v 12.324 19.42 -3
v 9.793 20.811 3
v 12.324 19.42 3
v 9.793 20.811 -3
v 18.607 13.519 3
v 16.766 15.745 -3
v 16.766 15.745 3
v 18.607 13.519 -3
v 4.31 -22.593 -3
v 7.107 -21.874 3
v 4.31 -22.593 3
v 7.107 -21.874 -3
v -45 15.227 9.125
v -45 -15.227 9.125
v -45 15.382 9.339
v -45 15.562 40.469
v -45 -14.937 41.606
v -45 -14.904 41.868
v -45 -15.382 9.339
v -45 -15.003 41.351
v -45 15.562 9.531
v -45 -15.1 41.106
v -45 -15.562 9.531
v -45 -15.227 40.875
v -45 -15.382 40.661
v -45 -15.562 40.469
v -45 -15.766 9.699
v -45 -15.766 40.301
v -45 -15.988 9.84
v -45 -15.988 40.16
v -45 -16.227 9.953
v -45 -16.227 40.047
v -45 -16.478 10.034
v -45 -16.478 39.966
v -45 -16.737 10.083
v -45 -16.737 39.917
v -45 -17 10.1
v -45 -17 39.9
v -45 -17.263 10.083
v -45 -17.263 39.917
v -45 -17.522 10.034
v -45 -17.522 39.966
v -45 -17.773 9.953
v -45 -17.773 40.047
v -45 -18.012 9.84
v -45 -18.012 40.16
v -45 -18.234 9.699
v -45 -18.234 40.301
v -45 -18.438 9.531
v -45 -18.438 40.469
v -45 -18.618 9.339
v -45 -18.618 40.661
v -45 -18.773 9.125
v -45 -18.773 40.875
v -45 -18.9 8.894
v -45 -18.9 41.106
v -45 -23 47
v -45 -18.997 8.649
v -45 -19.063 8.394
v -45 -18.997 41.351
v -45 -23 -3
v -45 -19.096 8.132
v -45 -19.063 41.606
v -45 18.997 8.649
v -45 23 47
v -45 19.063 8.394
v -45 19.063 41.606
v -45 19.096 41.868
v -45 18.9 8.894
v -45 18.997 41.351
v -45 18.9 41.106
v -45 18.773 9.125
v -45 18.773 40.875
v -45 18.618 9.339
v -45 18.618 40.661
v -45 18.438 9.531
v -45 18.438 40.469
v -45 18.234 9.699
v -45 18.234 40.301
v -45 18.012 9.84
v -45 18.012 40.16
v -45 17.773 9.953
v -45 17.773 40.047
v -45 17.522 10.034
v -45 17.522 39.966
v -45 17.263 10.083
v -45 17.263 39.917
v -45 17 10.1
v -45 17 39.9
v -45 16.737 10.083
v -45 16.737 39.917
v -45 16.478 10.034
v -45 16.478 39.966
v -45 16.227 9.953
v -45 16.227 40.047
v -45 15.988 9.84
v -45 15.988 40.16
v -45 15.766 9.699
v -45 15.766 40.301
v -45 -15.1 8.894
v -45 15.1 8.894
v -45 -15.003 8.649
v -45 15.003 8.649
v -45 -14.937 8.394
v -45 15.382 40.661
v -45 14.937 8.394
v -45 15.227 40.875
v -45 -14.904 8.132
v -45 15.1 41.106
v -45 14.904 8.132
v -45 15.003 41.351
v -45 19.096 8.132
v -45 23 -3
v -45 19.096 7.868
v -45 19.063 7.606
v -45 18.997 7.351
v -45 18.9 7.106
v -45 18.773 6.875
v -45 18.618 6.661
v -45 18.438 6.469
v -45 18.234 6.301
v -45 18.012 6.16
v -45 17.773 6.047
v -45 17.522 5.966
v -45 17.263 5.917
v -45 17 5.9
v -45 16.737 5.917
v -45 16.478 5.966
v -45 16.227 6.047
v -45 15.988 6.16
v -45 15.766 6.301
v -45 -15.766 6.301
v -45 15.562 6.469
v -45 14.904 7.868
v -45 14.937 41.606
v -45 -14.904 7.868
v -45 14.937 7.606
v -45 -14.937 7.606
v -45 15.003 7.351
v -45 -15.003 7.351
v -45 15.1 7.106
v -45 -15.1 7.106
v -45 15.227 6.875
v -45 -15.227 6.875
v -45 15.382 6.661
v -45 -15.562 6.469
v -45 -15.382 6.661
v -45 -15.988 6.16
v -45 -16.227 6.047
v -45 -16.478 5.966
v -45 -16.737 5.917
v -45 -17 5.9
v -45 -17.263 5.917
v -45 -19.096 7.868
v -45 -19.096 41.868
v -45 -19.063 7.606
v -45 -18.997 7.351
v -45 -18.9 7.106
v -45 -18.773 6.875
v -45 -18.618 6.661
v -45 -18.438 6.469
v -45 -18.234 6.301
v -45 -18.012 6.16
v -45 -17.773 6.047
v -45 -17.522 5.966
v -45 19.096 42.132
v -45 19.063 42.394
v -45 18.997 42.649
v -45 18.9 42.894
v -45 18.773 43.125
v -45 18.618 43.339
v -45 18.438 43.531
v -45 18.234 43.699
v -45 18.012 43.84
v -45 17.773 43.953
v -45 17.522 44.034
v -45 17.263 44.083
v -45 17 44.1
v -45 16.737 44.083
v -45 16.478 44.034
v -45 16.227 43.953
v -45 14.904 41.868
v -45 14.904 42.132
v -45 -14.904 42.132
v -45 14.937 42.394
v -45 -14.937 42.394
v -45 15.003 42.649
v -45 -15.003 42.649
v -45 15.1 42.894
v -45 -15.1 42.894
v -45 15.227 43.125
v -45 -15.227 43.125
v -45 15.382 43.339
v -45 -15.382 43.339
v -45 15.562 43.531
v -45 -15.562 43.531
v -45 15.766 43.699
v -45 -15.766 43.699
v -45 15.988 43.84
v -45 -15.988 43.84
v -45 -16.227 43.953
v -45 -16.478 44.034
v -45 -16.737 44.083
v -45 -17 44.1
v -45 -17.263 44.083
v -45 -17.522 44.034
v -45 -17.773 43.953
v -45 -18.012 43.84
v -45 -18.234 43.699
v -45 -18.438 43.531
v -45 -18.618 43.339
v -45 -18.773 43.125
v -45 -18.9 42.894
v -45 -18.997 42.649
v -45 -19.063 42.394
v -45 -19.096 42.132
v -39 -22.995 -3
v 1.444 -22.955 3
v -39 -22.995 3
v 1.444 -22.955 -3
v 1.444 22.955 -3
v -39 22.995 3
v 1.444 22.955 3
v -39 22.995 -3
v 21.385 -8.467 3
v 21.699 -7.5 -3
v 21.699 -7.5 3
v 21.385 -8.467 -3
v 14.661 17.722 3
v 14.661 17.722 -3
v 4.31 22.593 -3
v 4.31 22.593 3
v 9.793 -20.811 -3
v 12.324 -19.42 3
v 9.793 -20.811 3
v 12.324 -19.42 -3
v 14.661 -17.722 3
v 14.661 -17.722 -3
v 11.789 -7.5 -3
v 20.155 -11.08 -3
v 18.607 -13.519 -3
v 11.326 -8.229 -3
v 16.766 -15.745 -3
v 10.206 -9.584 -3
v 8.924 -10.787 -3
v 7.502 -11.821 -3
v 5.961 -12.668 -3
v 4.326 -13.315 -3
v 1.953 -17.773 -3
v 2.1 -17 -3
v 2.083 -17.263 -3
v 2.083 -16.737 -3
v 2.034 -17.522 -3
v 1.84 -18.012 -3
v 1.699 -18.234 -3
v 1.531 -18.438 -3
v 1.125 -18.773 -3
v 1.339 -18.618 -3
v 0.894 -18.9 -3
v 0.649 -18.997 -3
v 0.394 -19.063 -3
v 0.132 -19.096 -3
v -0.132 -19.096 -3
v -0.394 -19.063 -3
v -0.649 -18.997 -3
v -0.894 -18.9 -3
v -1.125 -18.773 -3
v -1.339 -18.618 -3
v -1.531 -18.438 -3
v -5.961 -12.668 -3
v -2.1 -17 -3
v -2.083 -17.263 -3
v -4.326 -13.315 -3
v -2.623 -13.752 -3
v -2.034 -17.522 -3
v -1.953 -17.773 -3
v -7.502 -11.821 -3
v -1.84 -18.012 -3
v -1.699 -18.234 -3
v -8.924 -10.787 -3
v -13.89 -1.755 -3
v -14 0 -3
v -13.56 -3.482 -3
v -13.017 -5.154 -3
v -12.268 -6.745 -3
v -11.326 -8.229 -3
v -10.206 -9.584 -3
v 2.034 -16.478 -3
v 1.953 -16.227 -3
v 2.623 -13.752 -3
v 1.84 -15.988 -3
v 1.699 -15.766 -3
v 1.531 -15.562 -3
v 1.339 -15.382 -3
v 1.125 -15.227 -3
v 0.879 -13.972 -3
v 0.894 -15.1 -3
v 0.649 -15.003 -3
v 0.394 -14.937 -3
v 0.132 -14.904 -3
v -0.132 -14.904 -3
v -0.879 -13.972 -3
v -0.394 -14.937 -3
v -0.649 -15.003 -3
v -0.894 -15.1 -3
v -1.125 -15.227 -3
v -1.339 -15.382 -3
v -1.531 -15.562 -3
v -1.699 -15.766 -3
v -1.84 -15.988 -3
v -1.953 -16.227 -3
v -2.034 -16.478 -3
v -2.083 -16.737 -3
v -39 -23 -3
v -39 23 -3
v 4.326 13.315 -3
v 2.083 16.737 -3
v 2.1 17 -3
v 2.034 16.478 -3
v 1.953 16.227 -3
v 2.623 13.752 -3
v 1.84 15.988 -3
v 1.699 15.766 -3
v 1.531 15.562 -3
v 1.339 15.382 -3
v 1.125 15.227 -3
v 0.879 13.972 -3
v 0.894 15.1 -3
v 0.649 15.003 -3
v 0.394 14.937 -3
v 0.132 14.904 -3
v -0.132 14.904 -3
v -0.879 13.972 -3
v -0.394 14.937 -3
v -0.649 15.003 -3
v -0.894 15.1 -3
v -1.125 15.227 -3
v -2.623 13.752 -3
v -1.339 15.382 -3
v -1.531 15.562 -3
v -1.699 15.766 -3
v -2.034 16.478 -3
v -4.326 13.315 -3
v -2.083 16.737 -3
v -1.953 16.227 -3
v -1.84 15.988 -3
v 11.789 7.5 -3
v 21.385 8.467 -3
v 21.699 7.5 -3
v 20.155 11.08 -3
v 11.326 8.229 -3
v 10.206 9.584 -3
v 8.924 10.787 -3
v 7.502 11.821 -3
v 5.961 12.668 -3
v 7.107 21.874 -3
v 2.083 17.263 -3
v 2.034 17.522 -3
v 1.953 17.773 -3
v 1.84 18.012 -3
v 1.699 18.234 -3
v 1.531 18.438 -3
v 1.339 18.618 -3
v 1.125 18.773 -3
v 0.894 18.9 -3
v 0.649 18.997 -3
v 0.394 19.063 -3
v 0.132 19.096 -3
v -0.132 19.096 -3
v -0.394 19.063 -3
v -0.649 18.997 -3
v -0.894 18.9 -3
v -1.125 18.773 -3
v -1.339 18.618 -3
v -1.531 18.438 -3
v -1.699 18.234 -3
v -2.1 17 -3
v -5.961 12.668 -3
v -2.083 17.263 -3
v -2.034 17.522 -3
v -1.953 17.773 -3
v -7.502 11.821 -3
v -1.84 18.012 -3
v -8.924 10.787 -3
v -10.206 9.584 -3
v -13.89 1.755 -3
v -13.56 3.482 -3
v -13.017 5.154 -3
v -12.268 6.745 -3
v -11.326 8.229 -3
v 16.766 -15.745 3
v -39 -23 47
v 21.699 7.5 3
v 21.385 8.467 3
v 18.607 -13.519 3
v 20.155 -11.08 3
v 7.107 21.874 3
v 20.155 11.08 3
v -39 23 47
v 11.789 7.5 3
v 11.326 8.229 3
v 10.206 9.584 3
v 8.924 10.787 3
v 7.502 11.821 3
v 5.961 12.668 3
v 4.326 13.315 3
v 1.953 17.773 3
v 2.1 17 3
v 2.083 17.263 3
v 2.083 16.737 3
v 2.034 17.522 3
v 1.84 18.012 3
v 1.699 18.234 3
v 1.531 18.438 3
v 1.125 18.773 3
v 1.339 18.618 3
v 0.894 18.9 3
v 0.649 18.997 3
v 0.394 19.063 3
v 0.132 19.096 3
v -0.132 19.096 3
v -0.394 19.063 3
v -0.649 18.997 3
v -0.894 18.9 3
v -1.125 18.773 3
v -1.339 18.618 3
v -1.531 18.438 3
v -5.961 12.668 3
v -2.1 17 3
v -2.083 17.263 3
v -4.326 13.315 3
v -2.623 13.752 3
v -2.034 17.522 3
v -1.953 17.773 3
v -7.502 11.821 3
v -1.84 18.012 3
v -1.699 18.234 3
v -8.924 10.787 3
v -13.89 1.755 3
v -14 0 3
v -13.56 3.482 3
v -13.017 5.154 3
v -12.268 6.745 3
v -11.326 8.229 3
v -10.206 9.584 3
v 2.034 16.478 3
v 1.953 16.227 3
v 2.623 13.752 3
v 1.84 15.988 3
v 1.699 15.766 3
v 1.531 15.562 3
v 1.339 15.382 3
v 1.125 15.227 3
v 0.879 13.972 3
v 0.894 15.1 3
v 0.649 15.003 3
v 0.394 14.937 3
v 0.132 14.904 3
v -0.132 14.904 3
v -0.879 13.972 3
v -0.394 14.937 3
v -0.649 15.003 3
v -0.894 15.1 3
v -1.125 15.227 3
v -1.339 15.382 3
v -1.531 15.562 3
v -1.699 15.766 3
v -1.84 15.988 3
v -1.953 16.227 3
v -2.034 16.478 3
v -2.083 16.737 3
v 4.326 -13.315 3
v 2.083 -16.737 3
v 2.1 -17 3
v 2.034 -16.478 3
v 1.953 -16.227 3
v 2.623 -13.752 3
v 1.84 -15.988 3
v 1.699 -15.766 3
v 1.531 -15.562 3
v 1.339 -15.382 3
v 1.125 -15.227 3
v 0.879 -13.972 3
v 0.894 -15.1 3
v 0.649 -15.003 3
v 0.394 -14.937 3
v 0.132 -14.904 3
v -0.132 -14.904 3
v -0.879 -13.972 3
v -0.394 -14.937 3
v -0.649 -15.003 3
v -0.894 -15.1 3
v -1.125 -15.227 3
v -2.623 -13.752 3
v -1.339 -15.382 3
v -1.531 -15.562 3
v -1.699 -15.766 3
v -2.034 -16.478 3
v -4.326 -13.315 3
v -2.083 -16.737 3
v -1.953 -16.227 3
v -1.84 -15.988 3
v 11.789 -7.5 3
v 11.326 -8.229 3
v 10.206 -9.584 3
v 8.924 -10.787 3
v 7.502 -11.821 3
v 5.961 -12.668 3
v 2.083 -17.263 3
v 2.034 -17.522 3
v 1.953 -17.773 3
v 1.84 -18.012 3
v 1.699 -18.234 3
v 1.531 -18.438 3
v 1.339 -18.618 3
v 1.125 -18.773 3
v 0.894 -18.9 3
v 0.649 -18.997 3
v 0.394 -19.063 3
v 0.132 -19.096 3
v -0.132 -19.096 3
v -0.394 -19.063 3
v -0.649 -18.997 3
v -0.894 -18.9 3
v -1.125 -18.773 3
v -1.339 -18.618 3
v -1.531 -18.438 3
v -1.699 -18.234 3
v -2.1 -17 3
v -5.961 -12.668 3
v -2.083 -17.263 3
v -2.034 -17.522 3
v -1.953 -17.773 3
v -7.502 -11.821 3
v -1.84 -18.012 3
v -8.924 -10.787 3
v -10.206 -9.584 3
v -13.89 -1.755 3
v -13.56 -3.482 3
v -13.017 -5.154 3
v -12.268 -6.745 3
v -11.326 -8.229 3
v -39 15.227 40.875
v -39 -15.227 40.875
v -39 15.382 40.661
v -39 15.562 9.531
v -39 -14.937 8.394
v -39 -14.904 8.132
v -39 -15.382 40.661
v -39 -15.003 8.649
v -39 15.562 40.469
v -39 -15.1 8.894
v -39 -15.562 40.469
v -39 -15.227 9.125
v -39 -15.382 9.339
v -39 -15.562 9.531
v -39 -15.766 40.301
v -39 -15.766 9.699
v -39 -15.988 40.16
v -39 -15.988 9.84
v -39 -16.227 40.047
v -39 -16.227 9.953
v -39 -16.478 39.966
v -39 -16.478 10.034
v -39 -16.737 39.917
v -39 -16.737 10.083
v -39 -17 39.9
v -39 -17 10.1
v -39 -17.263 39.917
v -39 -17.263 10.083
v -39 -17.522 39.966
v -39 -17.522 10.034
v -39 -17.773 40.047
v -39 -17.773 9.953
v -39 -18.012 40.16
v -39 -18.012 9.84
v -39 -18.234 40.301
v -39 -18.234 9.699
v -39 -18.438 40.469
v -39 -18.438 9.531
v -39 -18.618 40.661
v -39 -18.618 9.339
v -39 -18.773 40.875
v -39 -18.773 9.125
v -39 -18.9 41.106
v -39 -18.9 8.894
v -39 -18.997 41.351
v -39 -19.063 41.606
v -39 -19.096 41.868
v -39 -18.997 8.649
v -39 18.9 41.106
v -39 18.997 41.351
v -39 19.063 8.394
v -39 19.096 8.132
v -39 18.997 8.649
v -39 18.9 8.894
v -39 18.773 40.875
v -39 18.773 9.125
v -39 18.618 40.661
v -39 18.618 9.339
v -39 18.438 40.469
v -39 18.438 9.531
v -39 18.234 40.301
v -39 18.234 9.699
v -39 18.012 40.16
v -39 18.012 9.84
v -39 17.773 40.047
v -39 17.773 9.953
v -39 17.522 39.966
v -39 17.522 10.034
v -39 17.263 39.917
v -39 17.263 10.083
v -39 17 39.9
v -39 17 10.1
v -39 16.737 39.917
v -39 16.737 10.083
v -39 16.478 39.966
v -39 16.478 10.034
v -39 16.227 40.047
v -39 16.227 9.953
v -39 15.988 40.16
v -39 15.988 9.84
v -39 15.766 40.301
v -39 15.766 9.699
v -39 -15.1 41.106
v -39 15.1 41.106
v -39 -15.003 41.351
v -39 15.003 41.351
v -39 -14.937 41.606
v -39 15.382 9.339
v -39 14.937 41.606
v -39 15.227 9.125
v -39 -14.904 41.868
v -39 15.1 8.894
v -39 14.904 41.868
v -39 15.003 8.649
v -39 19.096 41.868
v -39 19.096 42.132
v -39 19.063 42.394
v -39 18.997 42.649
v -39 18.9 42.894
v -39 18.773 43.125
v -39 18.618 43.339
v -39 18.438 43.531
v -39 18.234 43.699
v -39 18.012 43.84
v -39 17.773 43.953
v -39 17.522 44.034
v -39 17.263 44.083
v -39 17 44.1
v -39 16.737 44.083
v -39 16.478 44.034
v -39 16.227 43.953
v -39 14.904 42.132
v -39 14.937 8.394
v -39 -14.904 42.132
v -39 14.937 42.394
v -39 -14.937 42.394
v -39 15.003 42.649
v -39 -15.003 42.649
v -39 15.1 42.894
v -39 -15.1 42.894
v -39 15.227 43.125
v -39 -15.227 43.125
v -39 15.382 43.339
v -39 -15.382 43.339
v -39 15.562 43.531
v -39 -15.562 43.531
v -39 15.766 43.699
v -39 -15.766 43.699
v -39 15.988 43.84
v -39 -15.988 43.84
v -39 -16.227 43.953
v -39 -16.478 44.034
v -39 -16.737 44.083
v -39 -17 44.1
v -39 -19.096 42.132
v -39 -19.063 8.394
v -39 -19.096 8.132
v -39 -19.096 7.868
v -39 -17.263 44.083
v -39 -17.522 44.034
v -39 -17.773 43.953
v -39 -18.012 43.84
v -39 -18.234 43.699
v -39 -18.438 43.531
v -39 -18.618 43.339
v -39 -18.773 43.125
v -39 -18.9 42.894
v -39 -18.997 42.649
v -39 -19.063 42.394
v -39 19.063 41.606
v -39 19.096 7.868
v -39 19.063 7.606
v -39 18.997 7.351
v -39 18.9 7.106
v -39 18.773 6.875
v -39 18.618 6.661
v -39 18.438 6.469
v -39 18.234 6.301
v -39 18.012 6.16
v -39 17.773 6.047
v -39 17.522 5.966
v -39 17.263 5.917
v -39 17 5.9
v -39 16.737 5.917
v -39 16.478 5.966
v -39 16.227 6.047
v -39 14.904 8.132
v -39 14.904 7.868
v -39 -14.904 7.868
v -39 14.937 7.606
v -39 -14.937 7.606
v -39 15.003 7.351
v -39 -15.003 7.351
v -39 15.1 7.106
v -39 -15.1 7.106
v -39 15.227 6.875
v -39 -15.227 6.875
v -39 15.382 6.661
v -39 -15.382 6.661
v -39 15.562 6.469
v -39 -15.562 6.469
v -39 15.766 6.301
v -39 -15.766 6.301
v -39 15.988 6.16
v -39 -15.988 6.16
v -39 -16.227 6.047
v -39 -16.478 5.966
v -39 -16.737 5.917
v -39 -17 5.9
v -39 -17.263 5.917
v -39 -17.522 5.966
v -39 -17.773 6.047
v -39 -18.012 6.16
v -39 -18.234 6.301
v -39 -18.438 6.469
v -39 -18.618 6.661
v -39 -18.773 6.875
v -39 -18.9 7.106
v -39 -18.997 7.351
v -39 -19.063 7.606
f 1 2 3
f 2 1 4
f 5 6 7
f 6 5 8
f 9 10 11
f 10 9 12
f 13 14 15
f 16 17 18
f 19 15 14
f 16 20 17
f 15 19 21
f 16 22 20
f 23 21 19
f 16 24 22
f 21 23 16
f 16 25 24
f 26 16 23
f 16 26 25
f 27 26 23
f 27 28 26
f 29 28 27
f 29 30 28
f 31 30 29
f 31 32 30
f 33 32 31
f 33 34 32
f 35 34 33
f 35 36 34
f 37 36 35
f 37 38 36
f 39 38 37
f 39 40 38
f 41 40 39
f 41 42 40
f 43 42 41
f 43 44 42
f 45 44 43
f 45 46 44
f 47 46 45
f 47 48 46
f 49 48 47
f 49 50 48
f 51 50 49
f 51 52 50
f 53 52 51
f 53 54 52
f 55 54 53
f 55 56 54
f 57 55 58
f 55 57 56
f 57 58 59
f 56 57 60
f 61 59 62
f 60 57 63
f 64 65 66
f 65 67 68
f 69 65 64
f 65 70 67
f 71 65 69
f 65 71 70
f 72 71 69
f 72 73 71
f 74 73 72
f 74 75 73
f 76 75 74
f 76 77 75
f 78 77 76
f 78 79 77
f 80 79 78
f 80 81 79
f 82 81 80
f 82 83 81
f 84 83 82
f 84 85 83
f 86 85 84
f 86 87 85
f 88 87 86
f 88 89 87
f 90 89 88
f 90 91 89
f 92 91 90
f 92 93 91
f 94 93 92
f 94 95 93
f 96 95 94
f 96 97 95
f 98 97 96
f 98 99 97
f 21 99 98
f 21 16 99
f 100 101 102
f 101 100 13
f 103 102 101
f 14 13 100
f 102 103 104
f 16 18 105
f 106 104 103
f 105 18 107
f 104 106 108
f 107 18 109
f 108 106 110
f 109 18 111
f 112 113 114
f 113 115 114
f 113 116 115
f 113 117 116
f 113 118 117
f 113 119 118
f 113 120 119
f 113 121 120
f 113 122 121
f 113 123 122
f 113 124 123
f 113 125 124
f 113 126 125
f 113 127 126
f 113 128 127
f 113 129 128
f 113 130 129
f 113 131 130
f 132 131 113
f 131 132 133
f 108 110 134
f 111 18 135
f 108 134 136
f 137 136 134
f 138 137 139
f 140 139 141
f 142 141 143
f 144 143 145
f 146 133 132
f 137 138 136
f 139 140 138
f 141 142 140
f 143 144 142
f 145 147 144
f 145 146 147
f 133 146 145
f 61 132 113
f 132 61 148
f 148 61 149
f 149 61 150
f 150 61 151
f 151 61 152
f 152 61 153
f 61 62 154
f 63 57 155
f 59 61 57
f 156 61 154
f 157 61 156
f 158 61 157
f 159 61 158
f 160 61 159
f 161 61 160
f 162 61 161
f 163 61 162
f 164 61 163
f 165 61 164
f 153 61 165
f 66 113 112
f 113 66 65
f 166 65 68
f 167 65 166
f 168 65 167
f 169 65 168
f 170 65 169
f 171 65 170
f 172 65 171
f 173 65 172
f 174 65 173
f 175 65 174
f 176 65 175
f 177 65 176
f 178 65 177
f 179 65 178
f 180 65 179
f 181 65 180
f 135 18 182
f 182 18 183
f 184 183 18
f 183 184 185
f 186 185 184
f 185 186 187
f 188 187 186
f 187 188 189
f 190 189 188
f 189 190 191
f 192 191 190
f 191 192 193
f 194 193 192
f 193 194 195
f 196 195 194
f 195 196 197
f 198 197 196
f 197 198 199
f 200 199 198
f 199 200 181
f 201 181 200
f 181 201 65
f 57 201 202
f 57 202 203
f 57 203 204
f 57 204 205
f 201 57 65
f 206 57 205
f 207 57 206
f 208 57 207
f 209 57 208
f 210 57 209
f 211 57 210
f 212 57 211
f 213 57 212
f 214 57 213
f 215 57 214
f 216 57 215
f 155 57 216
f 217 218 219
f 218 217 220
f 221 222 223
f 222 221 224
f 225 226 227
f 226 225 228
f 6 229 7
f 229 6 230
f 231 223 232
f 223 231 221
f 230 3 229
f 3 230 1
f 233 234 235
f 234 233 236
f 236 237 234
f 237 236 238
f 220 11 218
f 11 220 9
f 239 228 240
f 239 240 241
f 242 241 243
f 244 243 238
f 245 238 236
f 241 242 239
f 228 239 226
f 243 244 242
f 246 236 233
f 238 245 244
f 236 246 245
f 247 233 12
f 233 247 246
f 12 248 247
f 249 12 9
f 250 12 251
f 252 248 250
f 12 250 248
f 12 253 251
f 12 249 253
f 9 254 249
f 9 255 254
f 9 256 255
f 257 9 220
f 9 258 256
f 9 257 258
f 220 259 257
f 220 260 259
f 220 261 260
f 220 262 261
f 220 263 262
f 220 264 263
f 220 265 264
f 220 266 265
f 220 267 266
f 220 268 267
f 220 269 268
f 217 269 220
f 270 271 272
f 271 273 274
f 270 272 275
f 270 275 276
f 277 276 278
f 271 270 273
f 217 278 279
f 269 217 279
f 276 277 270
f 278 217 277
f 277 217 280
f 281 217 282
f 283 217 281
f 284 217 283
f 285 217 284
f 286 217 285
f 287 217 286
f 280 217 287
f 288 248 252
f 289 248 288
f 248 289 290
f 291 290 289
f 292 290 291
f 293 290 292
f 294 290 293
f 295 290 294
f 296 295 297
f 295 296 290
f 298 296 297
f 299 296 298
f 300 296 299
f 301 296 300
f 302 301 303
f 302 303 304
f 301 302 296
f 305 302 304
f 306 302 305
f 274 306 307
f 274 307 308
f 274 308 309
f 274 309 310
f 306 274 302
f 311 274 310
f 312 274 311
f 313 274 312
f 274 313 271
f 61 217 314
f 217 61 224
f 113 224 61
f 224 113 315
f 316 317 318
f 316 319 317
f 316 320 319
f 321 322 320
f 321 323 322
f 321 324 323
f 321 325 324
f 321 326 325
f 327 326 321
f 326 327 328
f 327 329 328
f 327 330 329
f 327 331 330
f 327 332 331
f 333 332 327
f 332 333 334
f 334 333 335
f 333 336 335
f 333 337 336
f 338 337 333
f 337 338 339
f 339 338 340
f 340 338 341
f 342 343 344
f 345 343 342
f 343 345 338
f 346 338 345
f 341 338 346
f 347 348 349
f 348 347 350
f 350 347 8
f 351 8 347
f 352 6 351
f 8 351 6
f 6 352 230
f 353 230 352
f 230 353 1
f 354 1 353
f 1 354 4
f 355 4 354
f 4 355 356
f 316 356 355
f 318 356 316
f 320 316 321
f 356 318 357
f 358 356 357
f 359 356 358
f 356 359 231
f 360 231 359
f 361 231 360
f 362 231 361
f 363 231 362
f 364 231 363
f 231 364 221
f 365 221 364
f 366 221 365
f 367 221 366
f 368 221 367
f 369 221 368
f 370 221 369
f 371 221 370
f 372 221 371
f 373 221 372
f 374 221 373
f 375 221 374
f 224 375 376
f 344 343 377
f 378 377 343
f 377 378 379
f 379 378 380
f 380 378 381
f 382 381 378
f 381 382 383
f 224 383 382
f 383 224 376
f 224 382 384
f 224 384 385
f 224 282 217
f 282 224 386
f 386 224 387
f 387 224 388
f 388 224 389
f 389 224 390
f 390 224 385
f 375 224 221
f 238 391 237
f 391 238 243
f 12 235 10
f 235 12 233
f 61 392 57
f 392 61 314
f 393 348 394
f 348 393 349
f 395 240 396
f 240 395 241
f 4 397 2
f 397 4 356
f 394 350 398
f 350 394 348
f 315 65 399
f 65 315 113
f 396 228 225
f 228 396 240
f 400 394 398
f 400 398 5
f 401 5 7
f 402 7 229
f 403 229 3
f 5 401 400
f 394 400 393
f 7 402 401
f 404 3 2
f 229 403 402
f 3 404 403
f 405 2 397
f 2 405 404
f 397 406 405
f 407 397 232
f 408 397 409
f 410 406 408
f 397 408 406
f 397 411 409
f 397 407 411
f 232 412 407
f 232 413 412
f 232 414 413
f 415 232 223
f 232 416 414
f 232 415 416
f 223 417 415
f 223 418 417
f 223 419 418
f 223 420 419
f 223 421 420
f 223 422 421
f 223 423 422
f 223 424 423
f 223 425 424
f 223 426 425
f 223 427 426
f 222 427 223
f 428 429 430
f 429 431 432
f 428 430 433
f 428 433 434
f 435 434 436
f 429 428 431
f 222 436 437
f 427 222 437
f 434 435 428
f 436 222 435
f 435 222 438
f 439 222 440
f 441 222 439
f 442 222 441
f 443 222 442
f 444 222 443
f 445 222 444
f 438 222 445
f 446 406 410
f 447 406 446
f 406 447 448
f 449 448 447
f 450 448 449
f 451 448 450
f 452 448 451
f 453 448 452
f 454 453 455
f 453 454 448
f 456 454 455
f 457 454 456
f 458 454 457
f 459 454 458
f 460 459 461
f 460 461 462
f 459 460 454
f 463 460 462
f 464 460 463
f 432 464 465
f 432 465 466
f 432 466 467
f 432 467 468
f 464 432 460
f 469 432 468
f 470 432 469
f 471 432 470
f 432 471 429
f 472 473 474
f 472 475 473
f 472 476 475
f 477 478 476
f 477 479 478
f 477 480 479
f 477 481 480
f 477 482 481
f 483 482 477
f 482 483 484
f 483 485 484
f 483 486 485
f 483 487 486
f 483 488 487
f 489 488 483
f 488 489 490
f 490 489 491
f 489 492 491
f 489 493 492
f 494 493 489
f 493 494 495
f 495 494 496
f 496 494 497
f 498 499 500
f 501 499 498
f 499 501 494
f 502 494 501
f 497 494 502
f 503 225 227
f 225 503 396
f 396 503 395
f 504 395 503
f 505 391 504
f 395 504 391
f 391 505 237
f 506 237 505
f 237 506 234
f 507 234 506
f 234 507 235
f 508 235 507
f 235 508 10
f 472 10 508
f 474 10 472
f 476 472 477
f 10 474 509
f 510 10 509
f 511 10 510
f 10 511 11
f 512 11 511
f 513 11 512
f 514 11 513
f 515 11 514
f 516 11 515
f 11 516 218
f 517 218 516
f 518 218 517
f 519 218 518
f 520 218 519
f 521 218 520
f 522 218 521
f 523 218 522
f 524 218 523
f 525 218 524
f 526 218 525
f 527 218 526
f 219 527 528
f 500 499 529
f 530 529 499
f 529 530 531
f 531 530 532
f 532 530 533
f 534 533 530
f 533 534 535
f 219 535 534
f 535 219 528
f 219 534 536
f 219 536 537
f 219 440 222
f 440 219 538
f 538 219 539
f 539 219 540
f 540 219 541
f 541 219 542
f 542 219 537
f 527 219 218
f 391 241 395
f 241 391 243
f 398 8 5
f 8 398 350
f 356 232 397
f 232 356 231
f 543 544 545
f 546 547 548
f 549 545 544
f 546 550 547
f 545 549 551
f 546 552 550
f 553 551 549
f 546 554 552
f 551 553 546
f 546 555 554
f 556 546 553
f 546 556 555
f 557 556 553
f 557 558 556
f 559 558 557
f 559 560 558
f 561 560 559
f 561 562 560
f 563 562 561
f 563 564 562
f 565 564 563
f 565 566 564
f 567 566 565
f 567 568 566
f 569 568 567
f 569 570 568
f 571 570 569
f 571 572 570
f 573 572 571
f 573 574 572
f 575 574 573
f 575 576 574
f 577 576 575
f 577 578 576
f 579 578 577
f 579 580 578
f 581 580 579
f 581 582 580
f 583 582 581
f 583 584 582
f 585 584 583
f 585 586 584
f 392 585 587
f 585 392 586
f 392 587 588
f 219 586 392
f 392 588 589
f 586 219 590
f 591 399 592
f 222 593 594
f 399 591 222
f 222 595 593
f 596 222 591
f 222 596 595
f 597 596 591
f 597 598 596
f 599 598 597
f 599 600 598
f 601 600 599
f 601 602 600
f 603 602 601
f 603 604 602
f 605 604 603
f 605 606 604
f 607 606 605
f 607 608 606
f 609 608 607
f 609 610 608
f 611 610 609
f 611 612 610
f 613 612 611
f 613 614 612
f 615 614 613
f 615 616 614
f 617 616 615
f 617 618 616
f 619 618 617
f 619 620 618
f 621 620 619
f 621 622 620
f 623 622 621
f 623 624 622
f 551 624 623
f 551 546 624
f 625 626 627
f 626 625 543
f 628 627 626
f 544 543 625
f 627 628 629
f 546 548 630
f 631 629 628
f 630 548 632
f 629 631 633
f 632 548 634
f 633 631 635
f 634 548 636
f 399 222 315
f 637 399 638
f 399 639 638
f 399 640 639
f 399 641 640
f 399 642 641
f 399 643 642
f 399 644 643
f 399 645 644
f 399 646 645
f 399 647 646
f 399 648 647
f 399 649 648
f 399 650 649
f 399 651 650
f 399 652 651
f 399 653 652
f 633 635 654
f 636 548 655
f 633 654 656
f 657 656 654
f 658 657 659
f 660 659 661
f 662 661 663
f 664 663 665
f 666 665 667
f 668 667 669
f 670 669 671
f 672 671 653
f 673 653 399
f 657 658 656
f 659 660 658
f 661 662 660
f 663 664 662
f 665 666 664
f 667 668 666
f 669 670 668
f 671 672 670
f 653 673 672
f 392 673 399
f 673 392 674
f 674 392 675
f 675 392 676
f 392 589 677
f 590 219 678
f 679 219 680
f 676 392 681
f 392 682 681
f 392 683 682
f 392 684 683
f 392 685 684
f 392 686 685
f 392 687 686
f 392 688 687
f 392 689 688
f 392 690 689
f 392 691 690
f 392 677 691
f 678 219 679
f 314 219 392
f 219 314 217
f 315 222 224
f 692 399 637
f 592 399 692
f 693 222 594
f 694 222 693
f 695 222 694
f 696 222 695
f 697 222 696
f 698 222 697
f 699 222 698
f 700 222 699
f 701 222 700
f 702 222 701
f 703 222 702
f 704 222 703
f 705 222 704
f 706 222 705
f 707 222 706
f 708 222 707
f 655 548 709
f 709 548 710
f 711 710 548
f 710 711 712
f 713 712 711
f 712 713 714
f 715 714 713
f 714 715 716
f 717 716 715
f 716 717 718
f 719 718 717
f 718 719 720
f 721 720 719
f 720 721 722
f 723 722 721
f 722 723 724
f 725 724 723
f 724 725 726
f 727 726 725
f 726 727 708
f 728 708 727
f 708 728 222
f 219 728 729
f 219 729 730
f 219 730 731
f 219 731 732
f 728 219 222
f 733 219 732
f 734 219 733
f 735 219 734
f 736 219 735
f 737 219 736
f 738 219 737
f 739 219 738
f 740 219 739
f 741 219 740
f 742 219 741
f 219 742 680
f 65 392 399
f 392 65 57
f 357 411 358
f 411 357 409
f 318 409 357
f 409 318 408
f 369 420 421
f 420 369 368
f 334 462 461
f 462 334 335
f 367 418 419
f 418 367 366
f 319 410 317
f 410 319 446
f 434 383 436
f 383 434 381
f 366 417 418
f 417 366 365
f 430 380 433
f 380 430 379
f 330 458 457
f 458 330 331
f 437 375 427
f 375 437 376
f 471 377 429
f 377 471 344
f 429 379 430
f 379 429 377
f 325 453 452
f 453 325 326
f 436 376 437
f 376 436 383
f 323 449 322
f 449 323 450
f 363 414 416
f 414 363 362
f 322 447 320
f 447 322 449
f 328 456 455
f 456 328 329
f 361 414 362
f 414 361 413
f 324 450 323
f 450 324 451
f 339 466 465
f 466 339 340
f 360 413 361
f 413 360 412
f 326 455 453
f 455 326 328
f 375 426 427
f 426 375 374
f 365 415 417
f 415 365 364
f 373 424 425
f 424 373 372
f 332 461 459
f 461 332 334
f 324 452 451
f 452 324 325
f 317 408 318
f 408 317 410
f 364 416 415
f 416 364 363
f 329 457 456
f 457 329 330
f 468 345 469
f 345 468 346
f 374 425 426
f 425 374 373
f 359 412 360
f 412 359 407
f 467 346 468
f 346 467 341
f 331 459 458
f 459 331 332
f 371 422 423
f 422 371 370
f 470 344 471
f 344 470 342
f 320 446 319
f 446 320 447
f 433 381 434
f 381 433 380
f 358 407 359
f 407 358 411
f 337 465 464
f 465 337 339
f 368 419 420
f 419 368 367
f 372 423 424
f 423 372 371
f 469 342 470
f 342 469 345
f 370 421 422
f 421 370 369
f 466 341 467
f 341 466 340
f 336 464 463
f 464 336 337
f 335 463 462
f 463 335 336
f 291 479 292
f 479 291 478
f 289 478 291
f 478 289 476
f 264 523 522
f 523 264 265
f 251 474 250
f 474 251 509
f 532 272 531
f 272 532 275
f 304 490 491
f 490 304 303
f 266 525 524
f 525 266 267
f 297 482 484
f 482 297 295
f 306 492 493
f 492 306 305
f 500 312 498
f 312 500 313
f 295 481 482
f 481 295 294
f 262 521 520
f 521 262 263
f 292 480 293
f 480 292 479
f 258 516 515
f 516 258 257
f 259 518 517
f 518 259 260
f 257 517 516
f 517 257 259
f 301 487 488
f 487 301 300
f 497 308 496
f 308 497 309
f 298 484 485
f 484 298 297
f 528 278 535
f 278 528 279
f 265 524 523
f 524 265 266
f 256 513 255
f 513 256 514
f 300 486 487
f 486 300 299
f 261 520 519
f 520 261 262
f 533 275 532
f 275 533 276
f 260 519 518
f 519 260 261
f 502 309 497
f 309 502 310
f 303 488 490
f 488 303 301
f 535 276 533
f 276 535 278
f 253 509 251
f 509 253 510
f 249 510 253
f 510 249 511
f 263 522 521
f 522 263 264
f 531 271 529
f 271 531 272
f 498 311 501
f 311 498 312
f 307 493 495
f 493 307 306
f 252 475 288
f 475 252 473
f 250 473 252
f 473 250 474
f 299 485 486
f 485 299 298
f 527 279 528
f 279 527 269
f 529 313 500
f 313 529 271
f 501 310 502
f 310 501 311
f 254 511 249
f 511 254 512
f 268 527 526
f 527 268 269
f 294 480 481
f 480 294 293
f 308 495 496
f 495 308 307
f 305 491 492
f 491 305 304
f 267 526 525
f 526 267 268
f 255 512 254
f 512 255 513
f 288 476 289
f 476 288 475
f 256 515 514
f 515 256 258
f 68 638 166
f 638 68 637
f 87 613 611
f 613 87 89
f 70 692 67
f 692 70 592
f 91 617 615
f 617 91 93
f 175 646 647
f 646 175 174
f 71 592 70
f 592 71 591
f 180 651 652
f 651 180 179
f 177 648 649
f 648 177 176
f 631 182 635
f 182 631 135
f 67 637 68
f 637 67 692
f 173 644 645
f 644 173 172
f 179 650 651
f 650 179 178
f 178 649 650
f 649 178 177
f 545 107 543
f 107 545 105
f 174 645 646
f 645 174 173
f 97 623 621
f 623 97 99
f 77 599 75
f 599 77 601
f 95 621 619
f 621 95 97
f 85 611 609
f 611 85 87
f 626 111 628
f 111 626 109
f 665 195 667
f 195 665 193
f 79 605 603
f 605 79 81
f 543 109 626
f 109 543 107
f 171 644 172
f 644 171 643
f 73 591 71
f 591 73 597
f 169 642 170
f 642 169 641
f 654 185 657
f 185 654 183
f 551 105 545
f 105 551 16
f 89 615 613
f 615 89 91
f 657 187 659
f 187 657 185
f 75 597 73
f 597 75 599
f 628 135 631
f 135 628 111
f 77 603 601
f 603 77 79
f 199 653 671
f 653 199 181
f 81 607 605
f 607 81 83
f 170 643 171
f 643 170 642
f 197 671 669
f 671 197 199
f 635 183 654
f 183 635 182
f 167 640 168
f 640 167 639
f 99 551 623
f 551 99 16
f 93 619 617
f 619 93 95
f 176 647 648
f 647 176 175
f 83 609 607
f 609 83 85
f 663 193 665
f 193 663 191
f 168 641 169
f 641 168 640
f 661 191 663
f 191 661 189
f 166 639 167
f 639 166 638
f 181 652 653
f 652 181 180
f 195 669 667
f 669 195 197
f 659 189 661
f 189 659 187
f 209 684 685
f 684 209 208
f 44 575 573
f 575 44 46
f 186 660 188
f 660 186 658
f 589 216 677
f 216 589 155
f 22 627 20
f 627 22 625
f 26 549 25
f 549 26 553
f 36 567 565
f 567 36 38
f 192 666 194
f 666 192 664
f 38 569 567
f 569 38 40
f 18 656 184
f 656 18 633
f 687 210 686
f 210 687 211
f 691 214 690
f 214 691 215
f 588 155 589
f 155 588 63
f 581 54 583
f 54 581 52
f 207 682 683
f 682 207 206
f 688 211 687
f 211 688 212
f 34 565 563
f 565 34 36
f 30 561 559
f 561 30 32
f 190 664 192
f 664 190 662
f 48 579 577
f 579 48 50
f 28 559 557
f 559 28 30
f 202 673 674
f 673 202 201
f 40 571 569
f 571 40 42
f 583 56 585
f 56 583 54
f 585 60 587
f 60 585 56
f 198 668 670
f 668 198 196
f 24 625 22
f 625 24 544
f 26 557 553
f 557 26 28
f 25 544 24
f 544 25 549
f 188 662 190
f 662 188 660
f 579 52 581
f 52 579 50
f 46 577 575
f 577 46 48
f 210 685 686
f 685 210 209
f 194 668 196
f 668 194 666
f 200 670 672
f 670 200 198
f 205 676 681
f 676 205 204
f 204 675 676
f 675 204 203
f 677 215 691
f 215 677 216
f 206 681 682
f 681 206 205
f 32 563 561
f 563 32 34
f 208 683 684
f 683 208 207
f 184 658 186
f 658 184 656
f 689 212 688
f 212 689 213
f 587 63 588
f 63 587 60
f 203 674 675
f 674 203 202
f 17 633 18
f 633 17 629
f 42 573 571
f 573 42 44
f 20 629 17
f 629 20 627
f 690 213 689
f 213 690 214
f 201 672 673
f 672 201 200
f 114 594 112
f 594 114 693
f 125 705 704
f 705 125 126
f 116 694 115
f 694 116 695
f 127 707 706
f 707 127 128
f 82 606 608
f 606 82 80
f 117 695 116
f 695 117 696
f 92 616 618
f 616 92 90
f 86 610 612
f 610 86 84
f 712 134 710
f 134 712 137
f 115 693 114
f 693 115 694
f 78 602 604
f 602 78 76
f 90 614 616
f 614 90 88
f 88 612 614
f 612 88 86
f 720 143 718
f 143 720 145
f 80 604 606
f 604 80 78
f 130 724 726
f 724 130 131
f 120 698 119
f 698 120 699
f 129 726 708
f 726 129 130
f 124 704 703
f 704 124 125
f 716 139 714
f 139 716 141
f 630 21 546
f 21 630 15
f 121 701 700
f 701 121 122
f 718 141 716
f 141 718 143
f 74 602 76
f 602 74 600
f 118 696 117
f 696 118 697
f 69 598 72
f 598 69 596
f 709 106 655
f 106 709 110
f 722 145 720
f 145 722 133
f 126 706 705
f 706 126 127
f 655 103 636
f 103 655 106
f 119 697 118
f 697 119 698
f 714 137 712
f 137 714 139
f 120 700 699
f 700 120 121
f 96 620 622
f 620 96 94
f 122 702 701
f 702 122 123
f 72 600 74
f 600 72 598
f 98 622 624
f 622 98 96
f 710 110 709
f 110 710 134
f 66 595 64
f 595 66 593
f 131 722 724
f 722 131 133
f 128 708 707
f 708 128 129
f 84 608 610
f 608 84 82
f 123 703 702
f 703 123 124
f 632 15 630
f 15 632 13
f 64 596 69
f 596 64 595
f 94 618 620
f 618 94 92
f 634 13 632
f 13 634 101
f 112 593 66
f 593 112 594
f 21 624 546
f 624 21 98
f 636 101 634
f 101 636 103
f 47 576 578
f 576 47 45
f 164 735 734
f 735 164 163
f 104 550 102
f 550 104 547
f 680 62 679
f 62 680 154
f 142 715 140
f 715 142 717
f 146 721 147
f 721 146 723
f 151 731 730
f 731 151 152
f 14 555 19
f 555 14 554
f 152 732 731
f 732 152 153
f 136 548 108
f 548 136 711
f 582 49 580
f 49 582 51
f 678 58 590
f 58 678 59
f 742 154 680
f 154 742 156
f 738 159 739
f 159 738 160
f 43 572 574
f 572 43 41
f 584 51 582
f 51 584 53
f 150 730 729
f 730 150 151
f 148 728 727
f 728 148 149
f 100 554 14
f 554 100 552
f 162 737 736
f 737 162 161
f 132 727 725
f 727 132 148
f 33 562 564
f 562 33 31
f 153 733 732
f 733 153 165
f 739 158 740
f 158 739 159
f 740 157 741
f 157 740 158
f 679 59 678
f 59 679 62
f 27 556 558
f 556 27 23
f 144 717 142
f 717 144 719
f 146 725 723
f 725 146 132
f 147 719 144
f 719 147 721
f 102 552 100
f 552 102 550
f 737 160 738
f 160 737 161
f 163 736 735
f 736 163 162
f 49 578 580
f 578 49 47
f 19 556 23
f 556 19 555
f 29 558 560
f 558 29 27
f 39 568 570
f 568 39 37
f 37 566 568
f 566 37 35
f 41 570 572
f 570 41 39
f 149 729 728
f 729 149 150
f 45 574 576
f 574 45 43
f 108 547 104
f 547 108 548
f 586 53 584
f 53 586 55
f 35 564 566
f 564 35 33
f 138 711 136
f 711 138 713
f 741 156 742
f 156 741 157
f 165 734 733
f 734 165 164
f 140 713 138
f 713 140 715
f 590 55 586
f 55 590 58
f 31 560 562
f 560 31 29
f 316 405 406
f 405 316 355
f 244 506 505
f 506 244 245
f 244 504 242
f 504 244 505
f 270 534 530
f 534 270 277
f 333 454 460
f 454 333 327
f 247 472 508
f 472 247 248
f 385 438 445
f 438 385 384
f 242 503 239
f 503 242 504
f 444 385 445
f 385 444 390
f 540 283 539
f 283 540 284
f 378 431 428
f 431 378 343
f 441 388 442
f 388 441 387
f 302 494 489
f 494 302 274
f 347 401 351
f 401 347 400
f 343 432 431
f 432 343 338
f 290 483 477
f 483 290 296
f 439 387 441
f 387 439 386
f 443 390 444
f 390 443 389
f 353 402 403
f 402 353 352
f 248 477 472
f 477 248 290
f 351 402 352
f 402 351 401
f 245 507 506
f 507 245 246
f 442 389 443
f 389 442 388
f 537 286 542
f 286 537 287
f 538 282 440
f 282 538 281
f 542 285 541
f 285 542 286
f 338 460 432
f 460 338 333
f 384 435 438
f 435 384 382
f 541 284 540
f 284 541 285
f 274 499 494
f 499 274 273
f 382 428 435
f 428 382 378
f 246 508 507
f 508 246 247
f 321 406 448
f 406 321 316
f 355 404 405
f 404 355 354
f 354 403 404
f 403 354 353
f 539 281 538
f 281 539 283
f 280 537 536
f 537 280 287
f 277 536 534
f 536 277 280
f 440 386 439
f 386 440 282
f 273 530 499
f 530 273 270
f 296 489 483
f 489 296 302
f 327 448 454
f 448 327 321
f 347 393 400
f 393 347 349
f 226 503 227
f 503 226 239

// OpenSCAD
//facet number
$fn=50;

outer_cylinder_radius = 23;
inner_cylinder_radius = 14;
thickness = 6;
bracket_width = 2 * outer_cylinder_radius;
bracket_height = 50;
bracket_length = 45;
screw_hole_radius = 2.1;
motor_screw_hole_distance = 17;
mounting_screw_hole_offset = 8;

//create cube
module top_cube() {
    cube_width = 15;
    translate([outer_cylinder_radius - cube_width, -cube_width/2, -cube_width/2])
    cube(cube_width);
}

//horizontal_bracket_piece
module horizontal_bracket_piece() {
    translate([-bracket_length, -bracket_width/2, -thickness/2])
    cube([1, bracket_width, thickness]);
    
}

//vertical_bracket_piece
module vertical_bracket_piece() {
    translate([-bracket_length, -bracket_width/2, -thickness/2])
    cube([thickness, bracket_width, bracket_height]);
}

//screw_hole
module screw_hole() {
    cylinder(thickness + 2, screw_hole_radius, screw_hole_radius);
}

//motor screw holes
module left_motor_scew_hole(){
    translate([0, motor_screw_hole_distance, -thickness/2 - 1])
    screw_hole();
}

module motor_screw_holes(){
    left_motor_scew_hole();
    mirror([0, 1, 0])
    left_motor_scew_hole();
}

//mounting screw holes
module get_to_bracket_center() {
    translate([-bracket_length -1 , 0, bracket_height / 2])
    children();
}

module mounting_screw_hole(alpha, beta) {
    translate([-bracket_length -1 , 0, bracket_height / 2])
    translate([0, cos(alpha) * motor_screw_hole_distance, (bracket_height / 2 - mounting_screw_hole_offset) * sin(beta)])
    rotate([0, 90, 0])
    screw_hole();
}

module mounting_screw_holes() {
    mounting_screw_hole(0, 90);
    mounting_screw_hole(180, 90);
    mounting_screw_hole(0, 270);
    mounting_screw_hole(180, 270);
    
}

//main cylinder
module main_cylinder() {
    cylinder(thickness, outer_cylinder_radius, outer_cylinder_radius, center=true);
}

module bracket_and_cylinder(){
     hull(){
        main_cylinder();
        horizontal_bracket_piece();
        }
    vertical_bracket_piece();
}

//ring
module bracket(){
    difference() {
        bracket_and_cylinder();
                
        cylinder(thickness+1, inner_cylinder_radius, inner_cylinder_radius, center=true);
        top_cube();
        motor_screw_holes();
        mounting_screw_holes();
    }
}
bracket();
